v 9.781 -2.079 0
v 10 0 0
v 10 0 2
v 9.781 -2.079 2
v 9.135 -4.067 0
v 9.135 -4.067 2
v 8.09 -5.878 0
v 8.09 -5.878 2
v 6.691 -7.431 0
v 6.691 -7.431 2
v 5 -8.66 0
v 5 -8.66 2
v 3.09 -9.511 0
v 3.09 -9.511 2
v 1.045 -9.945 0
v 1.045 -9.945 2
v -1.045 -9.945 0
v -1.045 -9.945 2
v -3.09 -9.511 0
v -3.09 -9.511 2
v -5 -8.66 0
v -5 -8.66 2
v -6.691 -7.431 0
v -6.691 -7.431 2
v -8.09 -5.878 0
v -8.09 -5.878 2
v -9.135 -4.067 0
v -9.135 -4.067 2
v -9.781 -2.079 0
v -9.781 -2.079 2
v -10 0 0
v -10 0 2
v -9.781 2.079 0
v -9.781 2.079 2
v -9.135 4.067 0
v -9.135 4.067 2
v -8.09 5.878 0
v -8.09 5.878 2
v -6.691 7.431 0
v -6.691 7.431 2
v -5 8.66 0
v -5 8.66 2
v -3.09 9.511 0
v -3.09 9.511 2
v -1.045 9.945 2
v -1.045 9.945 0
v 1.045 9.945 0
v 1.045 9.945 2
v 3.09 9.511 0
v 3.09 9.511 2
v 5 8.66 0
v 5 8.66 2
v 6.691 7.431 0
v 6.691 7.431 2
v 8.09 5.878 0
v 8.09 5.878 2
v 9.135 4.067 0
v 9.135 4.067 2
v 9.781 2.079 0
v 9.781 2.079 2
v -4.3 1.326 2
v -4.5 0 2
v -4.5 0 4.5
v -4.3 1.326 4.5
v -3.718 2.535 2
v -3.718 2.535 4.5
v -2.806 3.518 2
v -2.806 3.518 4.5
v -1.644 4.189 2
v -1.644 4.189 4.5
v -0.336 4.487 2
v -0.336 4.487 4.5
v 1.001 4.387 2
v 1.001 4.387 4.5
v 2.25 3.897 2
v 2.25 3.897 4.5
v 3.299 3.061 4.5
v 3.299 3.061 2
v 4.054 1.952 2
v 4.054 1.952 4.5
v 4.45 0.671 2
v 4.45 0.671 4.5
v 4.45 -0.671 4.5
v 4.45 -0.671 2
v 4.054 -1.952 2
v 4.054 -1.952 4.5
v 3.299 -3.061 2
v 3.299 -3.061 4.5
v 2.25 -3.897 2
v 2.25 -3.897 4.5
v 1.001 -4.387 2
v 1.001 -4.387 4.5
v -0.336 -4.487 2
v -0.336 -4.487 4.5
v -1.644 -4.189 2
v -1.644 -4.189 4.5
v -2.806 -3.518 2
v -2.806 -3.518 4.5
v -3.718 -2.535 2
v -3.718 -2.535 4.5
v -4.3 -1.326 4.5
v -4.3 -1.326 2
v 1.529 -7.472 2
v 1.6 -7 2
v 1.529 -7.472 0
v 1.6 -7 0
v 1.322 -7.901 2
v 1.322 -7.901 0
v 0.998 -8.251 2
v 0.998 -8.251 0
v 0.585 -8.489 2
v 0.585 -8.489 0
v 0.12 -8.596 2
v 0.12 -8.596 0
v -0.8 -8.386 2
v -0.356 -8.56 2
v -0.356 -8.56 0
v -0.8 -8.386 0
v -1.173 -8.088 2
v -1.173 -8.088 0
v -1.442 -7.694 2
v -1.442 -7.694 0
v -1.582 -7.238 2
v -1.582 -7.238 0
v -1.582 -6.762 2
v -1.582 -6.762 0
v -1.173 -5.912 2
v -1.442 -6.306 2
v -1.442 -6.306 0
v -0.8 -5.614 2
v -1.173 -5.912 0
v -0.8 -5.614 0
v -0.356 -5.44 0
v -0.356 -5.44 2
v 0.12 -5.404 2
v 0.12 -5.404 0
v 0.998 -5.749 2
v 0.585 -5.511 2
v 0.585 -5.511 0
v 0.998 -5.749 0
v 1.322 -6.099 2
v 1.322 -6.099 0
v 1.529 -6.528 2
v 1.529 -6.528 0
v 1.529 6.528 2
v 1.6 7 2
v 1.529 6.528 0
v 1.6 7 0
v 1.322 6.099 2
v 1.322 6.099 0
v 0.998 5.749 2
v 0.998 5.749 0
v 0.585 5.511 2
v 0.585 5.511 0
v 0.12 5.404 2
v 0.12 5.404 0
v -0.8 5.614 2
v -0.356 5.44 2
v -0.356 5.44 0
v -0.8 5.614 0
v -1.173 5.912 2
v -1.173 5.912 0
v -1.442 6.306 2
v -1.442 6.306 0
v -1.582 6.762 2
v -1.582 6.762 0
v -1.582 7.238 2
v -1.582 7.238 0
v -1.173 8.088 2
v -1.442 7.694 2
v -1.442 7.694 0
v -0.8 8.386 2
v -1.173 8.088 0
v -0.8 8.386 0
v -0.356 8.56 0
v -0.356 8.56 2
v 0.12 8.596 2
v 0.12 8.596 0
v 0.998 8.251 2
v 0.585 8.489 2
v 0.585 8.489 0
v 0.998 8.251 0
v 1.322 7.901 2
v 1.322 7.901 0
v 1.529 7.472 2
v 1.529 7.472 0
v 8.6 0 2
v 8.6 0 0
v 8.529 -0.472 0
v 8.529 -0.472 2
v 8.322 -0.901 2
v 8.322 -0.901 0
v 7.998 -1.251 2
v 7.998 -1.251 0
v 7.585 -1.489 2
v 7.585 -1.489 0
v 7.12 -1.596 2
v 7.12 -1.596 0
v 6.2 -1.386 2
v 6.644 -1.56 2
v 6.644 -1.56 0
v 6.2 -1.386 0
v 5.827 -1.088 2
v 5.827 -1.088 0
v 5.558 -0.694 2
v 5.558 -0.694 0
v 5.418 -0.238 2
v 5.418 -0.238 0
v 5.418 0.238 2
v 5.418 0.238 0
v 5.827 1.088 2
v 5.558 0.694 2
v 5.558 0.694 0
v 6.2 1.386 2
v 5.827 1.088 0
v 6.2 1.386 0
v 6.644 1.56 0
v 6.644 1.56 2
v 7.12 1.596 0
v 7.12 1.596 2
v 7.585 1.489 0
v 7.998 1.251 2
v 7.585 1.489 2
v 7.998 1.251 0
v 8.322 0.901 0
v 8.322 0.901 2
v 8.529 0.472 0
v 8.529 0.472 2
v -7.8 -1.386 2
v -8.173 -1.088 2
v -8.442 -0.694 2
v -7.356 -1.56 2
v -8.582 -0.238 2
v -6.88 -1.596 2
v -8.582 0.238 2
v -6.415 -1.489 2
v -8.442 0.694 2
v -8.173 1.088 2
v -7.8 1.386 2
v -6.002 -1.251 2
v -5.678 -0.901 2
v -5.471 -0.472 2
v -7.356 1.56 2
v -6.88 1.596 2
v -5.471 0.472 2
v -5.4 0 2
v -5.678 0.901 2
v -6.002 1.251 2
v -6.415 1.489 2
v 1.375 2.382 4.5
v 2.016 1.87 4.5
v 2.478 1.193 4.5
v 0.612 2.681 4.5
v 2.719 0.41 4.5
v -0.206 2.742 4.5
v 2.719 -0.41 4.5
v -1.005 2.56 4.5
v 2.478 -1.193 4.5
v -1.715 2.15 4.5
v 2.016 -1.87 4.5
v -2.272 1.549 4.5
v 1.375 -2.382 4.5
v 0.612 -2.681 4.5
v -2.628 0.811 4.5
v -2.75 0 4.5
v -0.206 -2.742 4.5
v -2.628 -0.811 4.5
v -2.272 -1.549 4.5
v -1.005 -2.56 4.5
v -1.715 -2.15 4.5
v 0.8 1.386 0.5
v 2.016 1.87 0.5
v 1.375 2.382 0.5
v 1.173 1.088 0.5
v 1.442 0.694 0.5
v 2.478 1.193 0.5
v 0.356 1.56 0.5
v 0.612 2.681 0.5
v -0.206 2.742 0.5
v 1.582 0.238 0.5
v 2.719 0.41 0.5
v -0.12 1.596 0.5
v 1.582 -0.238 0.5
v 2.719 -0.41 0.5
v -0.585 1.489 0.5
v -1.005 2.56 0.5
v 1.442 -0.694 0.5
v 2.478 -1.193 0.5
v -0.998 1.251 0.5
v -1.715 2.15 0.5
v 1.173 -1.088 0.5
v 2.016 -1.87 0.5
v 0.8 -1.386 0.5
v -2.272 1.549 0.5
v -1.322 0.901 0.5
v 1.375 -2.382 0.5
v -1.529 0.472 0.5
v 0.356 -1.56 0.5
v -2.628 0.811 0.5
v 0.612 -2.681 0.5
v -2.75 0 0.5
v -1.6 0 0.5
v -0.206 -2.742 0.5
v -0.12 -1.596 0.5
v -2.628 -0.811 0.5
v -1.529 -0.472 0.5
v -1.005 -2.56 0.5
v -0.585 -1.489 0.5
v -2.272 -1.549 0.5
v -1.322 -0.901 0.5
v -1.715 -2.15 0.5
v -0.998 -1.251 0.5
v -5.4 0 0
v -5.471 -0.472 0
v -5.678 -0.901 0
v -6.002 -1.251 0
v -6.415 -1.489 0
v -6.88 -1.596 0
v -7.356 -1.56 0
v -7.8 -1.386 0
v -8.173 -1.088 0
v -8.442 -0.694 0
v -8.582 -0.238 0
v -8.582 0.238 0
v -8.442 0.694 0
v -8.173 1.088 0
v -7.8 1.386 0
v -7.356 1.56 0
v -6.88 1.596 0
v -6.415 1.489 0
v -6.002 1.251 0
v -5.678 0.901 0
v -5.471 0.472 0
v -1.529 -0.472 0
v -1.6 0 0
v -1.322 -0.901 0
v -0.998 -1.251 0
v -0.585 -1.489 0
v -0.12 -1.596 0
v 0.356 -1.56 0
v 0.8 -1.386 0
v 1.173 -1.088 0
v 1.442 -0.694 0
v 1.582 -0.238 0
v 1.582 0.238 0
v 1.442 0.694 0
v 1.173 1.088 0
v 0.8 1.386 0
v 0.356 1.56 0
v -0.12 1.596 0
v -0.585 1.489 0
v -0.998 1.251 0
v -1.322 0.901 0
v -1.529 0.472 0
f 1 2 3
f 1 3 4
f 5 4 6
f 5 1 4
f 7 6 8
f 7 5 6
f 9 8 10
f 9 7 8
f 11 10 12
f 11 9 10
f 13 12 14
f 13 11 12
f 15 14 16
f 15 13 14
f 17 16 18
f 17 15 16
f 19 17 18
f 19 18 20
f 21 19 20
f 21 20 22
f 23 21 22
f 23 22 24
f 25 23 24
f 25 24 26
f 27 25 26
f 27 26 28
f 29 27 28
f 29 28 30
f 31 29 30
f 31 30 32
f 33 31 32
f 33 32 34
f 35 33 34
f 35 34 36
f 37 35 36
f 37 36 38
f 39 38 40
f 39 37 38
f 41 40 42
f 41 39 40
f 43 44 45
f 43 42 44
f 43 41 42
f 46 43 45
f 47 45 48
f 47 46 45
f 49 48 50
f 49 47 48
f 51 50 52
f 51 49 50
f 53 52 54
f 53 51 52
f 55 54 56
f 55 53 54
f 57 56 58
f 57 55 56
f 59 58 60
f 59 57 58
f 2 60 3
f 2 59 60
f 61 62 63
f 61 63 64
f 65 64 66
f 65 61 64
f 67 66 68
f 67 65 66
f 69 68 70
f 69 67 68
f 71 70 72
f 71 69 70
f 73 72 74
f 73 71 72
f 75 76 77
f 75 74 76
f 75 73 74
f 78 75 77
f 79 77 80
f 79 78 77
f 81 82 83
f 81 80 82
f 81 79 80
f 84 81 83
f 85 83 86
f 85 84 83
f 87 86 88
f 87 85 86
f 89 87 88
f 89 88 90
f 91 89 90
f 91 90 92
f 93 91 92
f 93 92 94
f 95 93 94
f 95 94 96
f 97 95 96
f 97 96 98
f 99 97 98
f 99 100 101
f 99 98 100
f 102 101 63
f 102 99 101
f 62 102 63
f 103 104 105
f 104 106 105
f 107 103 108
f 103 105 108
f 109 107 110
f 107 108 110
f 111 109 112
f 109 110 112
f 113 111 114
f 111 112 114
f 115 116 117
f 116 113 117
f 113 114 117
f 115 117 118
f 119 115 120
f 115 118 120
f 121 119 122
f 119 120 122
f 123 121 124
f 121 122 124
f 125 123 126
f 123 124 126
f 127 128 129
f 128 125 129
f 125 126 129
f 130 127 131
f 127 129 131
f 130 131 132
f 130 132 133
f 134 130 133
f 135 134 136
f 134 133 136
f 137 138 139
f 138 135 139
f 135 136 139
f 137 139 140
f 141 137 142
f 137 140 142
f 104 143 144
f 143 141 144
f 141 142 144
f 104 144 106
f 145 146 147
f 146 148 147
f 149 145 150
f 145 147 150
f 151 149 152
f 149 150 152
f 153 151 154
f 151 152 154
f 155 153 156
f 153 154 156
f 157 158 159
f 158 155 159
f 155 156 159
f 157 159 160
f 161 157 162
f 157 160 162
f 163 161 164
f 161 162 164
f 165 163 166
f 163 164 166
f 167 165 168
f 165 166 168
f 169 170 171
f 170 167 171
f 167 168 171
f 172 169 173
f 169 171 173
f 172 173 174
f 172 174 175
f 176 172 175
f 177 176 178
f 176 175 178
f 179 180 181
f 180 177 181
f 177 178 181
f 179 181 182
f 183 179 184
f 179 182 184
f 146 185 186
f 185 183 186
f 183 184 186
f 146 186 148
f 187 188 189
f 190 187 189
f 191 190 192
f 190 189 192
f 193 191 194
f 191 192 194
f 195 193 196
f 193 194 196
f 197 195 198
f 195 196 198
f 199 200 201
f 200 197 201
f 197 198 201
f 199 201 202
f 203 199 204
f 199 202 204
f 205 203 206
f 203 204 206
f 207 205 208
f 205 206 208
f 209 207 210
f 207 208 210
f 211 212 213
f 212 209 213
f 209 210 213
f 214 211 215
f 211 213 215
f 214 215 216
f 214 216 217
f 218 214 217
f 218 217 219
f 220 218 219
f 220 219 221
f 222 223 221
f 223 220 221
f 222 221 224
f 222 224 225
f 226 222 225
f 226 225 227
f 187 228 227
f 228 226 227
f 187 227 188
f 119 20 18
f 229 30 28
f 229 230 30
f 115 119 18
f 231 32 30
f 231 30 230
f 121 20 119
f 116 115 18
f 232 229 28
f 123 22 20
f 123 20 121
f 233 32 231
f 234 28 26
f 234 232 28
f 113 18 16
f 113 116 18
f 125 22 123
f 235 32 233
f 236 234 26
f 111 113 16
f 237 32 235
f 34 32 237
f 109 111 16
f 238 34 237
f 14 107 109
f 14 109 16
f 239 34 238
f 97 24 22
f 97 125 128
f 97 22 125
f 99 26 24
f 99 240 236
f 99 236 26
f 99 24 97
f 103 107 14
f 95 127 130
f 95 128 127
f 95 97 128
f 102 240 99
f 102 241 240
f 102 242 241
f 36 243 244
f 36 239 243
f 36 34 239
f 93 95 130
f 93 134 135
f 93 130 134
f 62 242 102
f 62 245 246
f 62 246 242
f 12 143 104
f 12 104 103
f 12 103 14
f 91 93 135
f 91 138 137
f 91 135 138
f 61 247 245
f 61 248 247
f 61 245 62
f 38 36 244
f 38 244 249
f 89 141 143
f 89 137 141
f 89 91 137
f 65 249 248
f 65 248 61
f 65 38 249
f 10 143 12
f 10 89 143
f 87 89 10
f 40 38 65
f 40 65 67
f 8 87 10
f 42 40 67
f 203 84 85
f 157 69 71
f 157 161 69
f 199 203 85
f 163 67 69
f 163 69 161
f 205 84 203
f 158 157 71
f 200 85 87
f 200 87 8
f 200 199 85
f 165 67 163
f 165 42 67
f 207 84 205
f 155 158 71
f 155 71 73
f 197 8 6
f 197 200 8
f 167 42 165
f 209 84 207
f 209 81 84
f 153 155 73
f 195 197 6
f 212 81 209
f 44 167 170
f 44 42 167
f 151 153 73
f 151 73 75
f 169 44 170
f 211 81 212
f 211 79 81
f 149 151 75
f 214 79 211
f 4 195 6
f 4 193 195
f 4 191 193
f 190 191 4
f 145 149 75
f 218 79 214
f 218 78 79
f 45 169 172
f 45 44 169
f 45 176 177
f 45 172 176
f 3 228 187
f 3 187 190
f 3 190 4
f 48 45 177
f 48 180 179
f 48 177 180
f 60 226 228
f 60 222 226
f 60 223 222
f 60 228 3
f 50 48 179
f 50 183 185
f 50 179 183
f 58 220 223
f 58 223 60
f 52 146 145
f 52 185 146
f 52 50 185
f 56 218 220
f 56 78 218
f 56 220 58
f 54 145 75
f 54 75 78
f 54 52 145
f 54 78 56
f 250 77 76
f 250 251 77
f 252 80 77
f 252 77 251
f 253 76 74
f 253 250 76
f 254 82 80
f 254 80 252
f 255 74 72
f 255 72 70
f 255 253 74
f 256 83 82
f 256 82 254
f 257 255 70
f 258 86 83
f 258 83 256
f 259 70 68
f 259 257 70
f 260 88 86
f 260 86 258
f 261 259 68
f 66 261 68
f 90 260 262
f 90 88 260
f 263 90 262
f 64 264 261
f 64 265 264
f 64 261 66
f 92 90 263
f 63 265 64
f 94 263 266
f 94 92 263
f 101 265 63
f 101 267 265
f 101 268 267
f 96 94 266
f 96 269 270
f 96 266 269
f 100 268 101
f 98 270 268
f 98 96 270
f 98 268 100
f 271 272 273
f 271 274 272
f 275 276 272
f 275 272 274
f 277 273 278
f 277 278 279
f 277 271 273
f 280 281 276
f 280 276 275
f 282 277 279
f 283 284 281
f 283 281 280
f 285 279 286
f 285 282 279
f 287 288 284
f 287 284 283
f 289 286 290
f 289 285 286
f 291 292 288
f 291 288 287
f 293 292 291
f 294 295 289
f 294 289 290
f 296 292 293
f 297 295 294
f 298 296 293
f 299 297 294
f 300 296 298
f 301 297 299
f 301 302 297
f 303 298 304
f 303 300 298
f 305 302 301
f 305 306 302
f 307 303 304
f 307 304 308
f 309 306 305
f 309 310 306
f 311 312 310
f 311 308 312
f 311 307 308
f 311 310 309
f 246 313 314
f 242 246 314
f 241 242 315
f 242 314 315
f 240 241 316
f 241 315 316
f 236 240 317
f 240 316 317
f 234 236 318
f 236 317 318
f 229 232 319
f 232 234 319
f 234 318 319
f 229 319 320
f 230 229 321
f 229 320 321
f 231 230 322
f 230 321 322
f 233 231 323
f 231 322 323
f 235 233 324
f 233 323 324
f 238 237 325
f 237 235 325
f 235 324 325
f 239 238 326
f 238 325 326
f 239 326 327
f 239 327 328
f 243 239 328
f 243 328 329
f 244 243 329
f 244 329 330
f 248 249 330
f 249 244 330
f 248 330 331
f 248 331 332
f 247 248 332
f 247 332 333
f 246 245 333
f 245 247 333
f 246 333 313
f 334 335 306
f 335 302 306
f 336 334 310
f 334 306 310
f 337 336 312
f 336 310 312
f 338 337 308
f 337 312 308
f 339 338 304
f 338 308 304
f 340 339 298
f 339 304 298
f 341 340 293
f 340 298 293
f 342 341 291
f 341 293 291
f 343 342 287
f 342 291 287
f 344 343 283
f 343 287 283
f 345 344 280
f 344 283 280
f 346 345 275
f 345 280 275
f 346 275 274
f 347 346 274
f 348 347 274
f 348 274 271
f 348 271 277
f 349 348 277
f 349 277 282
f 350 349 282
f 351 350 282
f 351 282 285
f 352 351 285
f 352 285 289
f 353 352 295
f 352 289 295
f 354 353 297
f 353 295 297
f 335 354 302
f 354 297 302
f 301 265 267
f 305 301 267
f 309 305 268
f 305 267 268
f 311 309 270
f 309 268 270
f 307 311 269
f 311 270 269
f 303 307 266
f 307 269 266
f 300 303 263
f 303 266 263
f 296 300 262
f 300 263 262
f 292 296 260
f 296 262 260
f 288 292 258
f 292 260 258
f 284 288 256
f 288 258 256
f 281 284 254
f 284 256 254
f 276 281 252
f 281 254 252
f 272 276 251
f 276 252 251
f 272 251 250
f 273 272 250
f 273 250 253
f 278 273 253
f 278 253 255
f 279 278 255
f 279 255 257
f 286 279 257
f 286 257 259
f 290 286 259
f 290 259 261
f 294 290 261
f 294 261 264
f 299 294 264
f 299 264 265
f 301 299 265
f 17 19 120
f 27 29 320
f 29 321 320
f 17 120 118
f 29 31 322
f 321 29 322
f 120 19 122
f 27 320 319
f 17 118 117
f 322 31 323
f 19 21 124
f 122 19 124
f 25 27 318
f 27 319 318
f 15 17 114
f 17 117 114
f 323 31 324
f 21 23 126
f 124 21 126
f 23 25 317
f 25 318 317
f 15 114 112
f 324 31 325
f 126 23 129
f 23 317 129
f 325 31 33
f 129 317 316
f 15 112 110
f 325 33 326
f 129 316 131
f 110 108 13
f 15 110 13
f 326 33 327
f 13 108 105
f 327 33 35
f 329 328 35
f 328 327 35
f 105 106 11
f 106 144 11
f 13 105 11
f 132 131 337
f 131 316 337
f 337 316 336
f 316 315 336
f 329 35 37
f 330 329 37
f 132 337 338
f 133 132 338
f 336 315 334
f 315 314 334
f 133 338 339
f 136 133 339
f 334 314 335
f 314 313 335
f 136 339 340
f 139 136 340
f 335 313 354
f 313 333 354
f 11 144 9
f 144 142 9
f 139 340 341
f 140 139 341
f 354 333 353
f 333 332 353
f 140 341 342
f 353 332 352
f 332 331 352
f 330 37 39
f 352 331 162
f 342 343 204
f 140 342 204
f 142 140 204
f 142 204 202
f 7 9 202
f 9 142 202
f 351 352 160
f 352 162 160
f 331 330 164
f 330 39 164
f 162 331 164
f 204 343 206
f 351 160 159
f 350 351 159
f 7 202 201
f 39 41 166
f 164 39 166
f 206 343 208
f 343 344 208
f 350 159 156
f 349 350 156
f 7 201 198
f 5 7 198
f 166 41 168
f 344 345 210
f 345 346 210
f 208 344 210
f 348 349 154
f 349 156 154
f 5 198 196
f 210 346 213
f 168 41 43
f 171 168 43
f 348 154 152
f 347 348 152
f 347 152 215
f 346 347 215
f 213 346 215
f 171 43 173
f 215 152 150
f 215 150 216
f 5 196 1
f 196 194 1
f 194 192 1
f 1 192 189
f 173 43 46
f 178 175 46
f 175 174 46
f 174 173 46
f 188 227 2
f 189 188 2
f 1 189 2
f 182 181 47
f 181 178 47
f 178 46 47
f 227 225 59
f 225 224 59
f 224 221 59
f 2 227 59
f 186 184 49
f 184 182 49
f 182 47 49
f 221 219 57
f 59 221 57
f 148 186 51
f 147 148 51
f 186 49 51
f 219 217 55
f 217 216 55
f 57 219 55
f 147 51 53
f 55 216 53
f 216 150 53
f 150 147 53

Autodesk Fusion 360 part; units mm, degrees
sketch "草图1" plane through (0, 0, 0) normal (0, 0, 1) x (1, 0, 0)
  circle A0 centre (0, 0) radius 10
  circle A1 centre (0, 0) radius 7 construction
  line L0 (-4, 0) -> (3, 0)
  circle A2 centre (7, 0) radius 1.6
  circle A3 centre (0, 7) radius 1.6
  circle A4 centre (-7, 0) radius 1.6
  circle A5 centre (0, -7) radius 1.6
  dimension "d1" = 20
  dimension "d2" = 14
  dimension "d3" = 3.2
  dimension "d5" = 360
extrude "拉伸1" add sketch "草图1" along normal blind 2 makes body 1
sketch "草图2" plane through (0, 0, 2) normal (0, 0, 1) x (-1, 0, 0)
  circle A0 centre (0, 7) radius 1.6
  circle A1 centre (7, 0) radius 1.6
  circle A2 centre (-7, 0) radius 1.6
  circle A3 centre (0, -7) radius 1.6
  circle A4 centre (0, 0) radius 10
  circle A5 centre (0, 0) radius 4.5
  dimension "d8" = 9
extrude "拉伸2" add sketch "草图2" along normal blind 2.5 contours A5 bodies 1
sketch "草图3" plane through (0, 0, 4.5) normal (0, 0, 1) x (-1, 0, 0)
  circle A0 centre (0, 0) radius 4.5
  circle A1 centre (0, 0) radius 2.75
  dimension "d11" = 5.5
extrude "拉伸3" cut sketch "草图3" against normal blind 4 contours A1 bodies 1
sketch "草图4" plane through (0, 0, 0.5) normal (0, 0, 1) x (-1, 0, 0)
  circle A0 centre (0, 0) radius 2.75
  circle A1 centre (0, 0) radius 1.6
  dimension "d14" = 3.2
extrude "拉伸4" cut sketch "草图4" against normal blind 2 contours A1 bodies 1
copy_body "实体->零部件1" bodies 1 removing the originals makes body 2 in component "金属舵盘"
component "金属舵盘" placed x (1, 0, 0) y (0, 1, 0) z (0, 0, 1) at (0, 0, 0)
